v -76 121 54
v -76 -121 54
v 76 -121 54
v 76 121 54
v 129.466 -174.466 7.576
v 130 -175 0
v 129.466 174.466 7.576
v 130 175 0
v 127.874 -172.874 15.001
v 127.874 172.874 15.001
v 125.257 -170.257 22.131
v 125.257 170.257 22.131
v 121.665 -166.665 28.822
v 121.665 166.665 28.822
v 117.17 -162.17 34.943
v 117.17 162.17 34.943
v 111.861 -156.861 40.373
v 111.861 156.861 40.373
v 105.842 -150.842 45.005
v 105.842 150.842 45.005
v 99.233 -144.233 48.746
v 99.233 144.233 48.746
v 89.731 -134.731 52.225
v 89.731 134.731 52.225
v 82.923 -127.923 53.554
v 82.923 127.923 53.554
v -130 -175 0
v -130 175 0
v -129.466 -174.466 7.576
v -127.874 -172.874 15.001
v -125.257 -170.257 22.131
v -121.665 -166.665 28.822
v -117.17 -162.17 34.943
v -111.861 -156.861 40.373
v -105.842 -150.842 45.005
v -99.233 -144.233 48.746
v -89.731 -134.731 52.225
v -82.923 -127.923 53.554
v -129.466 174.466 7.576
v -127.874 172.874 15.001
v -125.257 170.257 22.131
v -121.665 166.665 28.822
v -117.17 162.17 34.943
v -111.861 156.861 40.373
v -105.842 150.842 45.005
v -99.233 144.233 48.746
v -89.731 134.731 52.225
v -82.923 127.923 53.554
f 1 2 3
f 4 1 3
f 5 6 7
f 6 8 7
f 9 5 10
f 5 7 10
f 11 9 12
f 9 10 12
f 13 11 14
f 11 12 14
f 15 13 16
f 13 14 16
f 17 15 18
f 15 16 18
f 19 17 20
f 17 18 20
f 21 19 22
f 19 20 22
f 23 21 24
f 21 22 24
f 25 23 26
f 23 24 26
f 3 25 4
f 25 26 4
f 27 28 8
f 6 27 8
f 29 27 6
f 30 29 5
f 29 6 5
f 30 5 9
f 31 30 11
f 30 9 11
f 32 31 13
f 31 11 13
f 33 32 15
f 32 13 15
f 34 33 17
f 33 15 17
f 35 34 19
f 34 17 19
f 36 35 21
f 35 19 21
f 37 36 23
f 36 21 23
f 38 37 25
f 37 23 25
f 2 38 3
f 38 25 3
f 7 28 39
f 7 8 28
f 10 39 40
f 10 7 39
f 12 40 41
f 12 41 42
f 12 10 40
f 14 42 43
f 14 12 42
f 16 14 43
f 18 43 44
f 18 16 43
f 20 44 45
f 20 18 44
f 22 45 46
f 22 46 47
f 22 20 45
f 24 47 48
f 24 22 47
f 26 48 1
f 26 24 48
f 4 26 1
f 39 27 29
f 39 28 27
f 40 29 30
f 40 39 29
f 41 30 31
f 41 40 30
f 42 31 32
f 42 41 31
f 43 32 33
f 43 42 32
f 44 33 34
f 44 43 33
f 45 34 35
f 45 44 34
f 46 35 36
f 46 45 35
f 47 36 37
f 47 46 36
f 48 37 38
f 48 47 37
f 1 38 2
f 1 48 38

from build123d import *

# Parameters (mm, degrees)
SKETCH1_W           = 260
SKETCH1_H           = 350
BOSS_EXTRUDE1_DEPTH = 54
FILLET1_R           = 54


with BuildPart() as part:
    # Sketch1 → Boss-Extrude1 (new body)
    with BuildSketch(Plane.XY):
        Rectangle(SKETCH1_W, SKETCH1_H)
    extrude(amount=BOSS_EXTRUDE1_DEPTH)

    # Fillet1
    fillet1_edges = [part.edges().sort_by_distance(p)[0] for p in [
        (130, 0, 54),
        (-130, 0, 54),
        (0, -175, 54),
        (0, 175, 54),
    ]]
    fillet(fillet1_edges, radius=FILLET1_R - 0.0001)  # a hair under: the kernel refuses the full size


solid = part.part
